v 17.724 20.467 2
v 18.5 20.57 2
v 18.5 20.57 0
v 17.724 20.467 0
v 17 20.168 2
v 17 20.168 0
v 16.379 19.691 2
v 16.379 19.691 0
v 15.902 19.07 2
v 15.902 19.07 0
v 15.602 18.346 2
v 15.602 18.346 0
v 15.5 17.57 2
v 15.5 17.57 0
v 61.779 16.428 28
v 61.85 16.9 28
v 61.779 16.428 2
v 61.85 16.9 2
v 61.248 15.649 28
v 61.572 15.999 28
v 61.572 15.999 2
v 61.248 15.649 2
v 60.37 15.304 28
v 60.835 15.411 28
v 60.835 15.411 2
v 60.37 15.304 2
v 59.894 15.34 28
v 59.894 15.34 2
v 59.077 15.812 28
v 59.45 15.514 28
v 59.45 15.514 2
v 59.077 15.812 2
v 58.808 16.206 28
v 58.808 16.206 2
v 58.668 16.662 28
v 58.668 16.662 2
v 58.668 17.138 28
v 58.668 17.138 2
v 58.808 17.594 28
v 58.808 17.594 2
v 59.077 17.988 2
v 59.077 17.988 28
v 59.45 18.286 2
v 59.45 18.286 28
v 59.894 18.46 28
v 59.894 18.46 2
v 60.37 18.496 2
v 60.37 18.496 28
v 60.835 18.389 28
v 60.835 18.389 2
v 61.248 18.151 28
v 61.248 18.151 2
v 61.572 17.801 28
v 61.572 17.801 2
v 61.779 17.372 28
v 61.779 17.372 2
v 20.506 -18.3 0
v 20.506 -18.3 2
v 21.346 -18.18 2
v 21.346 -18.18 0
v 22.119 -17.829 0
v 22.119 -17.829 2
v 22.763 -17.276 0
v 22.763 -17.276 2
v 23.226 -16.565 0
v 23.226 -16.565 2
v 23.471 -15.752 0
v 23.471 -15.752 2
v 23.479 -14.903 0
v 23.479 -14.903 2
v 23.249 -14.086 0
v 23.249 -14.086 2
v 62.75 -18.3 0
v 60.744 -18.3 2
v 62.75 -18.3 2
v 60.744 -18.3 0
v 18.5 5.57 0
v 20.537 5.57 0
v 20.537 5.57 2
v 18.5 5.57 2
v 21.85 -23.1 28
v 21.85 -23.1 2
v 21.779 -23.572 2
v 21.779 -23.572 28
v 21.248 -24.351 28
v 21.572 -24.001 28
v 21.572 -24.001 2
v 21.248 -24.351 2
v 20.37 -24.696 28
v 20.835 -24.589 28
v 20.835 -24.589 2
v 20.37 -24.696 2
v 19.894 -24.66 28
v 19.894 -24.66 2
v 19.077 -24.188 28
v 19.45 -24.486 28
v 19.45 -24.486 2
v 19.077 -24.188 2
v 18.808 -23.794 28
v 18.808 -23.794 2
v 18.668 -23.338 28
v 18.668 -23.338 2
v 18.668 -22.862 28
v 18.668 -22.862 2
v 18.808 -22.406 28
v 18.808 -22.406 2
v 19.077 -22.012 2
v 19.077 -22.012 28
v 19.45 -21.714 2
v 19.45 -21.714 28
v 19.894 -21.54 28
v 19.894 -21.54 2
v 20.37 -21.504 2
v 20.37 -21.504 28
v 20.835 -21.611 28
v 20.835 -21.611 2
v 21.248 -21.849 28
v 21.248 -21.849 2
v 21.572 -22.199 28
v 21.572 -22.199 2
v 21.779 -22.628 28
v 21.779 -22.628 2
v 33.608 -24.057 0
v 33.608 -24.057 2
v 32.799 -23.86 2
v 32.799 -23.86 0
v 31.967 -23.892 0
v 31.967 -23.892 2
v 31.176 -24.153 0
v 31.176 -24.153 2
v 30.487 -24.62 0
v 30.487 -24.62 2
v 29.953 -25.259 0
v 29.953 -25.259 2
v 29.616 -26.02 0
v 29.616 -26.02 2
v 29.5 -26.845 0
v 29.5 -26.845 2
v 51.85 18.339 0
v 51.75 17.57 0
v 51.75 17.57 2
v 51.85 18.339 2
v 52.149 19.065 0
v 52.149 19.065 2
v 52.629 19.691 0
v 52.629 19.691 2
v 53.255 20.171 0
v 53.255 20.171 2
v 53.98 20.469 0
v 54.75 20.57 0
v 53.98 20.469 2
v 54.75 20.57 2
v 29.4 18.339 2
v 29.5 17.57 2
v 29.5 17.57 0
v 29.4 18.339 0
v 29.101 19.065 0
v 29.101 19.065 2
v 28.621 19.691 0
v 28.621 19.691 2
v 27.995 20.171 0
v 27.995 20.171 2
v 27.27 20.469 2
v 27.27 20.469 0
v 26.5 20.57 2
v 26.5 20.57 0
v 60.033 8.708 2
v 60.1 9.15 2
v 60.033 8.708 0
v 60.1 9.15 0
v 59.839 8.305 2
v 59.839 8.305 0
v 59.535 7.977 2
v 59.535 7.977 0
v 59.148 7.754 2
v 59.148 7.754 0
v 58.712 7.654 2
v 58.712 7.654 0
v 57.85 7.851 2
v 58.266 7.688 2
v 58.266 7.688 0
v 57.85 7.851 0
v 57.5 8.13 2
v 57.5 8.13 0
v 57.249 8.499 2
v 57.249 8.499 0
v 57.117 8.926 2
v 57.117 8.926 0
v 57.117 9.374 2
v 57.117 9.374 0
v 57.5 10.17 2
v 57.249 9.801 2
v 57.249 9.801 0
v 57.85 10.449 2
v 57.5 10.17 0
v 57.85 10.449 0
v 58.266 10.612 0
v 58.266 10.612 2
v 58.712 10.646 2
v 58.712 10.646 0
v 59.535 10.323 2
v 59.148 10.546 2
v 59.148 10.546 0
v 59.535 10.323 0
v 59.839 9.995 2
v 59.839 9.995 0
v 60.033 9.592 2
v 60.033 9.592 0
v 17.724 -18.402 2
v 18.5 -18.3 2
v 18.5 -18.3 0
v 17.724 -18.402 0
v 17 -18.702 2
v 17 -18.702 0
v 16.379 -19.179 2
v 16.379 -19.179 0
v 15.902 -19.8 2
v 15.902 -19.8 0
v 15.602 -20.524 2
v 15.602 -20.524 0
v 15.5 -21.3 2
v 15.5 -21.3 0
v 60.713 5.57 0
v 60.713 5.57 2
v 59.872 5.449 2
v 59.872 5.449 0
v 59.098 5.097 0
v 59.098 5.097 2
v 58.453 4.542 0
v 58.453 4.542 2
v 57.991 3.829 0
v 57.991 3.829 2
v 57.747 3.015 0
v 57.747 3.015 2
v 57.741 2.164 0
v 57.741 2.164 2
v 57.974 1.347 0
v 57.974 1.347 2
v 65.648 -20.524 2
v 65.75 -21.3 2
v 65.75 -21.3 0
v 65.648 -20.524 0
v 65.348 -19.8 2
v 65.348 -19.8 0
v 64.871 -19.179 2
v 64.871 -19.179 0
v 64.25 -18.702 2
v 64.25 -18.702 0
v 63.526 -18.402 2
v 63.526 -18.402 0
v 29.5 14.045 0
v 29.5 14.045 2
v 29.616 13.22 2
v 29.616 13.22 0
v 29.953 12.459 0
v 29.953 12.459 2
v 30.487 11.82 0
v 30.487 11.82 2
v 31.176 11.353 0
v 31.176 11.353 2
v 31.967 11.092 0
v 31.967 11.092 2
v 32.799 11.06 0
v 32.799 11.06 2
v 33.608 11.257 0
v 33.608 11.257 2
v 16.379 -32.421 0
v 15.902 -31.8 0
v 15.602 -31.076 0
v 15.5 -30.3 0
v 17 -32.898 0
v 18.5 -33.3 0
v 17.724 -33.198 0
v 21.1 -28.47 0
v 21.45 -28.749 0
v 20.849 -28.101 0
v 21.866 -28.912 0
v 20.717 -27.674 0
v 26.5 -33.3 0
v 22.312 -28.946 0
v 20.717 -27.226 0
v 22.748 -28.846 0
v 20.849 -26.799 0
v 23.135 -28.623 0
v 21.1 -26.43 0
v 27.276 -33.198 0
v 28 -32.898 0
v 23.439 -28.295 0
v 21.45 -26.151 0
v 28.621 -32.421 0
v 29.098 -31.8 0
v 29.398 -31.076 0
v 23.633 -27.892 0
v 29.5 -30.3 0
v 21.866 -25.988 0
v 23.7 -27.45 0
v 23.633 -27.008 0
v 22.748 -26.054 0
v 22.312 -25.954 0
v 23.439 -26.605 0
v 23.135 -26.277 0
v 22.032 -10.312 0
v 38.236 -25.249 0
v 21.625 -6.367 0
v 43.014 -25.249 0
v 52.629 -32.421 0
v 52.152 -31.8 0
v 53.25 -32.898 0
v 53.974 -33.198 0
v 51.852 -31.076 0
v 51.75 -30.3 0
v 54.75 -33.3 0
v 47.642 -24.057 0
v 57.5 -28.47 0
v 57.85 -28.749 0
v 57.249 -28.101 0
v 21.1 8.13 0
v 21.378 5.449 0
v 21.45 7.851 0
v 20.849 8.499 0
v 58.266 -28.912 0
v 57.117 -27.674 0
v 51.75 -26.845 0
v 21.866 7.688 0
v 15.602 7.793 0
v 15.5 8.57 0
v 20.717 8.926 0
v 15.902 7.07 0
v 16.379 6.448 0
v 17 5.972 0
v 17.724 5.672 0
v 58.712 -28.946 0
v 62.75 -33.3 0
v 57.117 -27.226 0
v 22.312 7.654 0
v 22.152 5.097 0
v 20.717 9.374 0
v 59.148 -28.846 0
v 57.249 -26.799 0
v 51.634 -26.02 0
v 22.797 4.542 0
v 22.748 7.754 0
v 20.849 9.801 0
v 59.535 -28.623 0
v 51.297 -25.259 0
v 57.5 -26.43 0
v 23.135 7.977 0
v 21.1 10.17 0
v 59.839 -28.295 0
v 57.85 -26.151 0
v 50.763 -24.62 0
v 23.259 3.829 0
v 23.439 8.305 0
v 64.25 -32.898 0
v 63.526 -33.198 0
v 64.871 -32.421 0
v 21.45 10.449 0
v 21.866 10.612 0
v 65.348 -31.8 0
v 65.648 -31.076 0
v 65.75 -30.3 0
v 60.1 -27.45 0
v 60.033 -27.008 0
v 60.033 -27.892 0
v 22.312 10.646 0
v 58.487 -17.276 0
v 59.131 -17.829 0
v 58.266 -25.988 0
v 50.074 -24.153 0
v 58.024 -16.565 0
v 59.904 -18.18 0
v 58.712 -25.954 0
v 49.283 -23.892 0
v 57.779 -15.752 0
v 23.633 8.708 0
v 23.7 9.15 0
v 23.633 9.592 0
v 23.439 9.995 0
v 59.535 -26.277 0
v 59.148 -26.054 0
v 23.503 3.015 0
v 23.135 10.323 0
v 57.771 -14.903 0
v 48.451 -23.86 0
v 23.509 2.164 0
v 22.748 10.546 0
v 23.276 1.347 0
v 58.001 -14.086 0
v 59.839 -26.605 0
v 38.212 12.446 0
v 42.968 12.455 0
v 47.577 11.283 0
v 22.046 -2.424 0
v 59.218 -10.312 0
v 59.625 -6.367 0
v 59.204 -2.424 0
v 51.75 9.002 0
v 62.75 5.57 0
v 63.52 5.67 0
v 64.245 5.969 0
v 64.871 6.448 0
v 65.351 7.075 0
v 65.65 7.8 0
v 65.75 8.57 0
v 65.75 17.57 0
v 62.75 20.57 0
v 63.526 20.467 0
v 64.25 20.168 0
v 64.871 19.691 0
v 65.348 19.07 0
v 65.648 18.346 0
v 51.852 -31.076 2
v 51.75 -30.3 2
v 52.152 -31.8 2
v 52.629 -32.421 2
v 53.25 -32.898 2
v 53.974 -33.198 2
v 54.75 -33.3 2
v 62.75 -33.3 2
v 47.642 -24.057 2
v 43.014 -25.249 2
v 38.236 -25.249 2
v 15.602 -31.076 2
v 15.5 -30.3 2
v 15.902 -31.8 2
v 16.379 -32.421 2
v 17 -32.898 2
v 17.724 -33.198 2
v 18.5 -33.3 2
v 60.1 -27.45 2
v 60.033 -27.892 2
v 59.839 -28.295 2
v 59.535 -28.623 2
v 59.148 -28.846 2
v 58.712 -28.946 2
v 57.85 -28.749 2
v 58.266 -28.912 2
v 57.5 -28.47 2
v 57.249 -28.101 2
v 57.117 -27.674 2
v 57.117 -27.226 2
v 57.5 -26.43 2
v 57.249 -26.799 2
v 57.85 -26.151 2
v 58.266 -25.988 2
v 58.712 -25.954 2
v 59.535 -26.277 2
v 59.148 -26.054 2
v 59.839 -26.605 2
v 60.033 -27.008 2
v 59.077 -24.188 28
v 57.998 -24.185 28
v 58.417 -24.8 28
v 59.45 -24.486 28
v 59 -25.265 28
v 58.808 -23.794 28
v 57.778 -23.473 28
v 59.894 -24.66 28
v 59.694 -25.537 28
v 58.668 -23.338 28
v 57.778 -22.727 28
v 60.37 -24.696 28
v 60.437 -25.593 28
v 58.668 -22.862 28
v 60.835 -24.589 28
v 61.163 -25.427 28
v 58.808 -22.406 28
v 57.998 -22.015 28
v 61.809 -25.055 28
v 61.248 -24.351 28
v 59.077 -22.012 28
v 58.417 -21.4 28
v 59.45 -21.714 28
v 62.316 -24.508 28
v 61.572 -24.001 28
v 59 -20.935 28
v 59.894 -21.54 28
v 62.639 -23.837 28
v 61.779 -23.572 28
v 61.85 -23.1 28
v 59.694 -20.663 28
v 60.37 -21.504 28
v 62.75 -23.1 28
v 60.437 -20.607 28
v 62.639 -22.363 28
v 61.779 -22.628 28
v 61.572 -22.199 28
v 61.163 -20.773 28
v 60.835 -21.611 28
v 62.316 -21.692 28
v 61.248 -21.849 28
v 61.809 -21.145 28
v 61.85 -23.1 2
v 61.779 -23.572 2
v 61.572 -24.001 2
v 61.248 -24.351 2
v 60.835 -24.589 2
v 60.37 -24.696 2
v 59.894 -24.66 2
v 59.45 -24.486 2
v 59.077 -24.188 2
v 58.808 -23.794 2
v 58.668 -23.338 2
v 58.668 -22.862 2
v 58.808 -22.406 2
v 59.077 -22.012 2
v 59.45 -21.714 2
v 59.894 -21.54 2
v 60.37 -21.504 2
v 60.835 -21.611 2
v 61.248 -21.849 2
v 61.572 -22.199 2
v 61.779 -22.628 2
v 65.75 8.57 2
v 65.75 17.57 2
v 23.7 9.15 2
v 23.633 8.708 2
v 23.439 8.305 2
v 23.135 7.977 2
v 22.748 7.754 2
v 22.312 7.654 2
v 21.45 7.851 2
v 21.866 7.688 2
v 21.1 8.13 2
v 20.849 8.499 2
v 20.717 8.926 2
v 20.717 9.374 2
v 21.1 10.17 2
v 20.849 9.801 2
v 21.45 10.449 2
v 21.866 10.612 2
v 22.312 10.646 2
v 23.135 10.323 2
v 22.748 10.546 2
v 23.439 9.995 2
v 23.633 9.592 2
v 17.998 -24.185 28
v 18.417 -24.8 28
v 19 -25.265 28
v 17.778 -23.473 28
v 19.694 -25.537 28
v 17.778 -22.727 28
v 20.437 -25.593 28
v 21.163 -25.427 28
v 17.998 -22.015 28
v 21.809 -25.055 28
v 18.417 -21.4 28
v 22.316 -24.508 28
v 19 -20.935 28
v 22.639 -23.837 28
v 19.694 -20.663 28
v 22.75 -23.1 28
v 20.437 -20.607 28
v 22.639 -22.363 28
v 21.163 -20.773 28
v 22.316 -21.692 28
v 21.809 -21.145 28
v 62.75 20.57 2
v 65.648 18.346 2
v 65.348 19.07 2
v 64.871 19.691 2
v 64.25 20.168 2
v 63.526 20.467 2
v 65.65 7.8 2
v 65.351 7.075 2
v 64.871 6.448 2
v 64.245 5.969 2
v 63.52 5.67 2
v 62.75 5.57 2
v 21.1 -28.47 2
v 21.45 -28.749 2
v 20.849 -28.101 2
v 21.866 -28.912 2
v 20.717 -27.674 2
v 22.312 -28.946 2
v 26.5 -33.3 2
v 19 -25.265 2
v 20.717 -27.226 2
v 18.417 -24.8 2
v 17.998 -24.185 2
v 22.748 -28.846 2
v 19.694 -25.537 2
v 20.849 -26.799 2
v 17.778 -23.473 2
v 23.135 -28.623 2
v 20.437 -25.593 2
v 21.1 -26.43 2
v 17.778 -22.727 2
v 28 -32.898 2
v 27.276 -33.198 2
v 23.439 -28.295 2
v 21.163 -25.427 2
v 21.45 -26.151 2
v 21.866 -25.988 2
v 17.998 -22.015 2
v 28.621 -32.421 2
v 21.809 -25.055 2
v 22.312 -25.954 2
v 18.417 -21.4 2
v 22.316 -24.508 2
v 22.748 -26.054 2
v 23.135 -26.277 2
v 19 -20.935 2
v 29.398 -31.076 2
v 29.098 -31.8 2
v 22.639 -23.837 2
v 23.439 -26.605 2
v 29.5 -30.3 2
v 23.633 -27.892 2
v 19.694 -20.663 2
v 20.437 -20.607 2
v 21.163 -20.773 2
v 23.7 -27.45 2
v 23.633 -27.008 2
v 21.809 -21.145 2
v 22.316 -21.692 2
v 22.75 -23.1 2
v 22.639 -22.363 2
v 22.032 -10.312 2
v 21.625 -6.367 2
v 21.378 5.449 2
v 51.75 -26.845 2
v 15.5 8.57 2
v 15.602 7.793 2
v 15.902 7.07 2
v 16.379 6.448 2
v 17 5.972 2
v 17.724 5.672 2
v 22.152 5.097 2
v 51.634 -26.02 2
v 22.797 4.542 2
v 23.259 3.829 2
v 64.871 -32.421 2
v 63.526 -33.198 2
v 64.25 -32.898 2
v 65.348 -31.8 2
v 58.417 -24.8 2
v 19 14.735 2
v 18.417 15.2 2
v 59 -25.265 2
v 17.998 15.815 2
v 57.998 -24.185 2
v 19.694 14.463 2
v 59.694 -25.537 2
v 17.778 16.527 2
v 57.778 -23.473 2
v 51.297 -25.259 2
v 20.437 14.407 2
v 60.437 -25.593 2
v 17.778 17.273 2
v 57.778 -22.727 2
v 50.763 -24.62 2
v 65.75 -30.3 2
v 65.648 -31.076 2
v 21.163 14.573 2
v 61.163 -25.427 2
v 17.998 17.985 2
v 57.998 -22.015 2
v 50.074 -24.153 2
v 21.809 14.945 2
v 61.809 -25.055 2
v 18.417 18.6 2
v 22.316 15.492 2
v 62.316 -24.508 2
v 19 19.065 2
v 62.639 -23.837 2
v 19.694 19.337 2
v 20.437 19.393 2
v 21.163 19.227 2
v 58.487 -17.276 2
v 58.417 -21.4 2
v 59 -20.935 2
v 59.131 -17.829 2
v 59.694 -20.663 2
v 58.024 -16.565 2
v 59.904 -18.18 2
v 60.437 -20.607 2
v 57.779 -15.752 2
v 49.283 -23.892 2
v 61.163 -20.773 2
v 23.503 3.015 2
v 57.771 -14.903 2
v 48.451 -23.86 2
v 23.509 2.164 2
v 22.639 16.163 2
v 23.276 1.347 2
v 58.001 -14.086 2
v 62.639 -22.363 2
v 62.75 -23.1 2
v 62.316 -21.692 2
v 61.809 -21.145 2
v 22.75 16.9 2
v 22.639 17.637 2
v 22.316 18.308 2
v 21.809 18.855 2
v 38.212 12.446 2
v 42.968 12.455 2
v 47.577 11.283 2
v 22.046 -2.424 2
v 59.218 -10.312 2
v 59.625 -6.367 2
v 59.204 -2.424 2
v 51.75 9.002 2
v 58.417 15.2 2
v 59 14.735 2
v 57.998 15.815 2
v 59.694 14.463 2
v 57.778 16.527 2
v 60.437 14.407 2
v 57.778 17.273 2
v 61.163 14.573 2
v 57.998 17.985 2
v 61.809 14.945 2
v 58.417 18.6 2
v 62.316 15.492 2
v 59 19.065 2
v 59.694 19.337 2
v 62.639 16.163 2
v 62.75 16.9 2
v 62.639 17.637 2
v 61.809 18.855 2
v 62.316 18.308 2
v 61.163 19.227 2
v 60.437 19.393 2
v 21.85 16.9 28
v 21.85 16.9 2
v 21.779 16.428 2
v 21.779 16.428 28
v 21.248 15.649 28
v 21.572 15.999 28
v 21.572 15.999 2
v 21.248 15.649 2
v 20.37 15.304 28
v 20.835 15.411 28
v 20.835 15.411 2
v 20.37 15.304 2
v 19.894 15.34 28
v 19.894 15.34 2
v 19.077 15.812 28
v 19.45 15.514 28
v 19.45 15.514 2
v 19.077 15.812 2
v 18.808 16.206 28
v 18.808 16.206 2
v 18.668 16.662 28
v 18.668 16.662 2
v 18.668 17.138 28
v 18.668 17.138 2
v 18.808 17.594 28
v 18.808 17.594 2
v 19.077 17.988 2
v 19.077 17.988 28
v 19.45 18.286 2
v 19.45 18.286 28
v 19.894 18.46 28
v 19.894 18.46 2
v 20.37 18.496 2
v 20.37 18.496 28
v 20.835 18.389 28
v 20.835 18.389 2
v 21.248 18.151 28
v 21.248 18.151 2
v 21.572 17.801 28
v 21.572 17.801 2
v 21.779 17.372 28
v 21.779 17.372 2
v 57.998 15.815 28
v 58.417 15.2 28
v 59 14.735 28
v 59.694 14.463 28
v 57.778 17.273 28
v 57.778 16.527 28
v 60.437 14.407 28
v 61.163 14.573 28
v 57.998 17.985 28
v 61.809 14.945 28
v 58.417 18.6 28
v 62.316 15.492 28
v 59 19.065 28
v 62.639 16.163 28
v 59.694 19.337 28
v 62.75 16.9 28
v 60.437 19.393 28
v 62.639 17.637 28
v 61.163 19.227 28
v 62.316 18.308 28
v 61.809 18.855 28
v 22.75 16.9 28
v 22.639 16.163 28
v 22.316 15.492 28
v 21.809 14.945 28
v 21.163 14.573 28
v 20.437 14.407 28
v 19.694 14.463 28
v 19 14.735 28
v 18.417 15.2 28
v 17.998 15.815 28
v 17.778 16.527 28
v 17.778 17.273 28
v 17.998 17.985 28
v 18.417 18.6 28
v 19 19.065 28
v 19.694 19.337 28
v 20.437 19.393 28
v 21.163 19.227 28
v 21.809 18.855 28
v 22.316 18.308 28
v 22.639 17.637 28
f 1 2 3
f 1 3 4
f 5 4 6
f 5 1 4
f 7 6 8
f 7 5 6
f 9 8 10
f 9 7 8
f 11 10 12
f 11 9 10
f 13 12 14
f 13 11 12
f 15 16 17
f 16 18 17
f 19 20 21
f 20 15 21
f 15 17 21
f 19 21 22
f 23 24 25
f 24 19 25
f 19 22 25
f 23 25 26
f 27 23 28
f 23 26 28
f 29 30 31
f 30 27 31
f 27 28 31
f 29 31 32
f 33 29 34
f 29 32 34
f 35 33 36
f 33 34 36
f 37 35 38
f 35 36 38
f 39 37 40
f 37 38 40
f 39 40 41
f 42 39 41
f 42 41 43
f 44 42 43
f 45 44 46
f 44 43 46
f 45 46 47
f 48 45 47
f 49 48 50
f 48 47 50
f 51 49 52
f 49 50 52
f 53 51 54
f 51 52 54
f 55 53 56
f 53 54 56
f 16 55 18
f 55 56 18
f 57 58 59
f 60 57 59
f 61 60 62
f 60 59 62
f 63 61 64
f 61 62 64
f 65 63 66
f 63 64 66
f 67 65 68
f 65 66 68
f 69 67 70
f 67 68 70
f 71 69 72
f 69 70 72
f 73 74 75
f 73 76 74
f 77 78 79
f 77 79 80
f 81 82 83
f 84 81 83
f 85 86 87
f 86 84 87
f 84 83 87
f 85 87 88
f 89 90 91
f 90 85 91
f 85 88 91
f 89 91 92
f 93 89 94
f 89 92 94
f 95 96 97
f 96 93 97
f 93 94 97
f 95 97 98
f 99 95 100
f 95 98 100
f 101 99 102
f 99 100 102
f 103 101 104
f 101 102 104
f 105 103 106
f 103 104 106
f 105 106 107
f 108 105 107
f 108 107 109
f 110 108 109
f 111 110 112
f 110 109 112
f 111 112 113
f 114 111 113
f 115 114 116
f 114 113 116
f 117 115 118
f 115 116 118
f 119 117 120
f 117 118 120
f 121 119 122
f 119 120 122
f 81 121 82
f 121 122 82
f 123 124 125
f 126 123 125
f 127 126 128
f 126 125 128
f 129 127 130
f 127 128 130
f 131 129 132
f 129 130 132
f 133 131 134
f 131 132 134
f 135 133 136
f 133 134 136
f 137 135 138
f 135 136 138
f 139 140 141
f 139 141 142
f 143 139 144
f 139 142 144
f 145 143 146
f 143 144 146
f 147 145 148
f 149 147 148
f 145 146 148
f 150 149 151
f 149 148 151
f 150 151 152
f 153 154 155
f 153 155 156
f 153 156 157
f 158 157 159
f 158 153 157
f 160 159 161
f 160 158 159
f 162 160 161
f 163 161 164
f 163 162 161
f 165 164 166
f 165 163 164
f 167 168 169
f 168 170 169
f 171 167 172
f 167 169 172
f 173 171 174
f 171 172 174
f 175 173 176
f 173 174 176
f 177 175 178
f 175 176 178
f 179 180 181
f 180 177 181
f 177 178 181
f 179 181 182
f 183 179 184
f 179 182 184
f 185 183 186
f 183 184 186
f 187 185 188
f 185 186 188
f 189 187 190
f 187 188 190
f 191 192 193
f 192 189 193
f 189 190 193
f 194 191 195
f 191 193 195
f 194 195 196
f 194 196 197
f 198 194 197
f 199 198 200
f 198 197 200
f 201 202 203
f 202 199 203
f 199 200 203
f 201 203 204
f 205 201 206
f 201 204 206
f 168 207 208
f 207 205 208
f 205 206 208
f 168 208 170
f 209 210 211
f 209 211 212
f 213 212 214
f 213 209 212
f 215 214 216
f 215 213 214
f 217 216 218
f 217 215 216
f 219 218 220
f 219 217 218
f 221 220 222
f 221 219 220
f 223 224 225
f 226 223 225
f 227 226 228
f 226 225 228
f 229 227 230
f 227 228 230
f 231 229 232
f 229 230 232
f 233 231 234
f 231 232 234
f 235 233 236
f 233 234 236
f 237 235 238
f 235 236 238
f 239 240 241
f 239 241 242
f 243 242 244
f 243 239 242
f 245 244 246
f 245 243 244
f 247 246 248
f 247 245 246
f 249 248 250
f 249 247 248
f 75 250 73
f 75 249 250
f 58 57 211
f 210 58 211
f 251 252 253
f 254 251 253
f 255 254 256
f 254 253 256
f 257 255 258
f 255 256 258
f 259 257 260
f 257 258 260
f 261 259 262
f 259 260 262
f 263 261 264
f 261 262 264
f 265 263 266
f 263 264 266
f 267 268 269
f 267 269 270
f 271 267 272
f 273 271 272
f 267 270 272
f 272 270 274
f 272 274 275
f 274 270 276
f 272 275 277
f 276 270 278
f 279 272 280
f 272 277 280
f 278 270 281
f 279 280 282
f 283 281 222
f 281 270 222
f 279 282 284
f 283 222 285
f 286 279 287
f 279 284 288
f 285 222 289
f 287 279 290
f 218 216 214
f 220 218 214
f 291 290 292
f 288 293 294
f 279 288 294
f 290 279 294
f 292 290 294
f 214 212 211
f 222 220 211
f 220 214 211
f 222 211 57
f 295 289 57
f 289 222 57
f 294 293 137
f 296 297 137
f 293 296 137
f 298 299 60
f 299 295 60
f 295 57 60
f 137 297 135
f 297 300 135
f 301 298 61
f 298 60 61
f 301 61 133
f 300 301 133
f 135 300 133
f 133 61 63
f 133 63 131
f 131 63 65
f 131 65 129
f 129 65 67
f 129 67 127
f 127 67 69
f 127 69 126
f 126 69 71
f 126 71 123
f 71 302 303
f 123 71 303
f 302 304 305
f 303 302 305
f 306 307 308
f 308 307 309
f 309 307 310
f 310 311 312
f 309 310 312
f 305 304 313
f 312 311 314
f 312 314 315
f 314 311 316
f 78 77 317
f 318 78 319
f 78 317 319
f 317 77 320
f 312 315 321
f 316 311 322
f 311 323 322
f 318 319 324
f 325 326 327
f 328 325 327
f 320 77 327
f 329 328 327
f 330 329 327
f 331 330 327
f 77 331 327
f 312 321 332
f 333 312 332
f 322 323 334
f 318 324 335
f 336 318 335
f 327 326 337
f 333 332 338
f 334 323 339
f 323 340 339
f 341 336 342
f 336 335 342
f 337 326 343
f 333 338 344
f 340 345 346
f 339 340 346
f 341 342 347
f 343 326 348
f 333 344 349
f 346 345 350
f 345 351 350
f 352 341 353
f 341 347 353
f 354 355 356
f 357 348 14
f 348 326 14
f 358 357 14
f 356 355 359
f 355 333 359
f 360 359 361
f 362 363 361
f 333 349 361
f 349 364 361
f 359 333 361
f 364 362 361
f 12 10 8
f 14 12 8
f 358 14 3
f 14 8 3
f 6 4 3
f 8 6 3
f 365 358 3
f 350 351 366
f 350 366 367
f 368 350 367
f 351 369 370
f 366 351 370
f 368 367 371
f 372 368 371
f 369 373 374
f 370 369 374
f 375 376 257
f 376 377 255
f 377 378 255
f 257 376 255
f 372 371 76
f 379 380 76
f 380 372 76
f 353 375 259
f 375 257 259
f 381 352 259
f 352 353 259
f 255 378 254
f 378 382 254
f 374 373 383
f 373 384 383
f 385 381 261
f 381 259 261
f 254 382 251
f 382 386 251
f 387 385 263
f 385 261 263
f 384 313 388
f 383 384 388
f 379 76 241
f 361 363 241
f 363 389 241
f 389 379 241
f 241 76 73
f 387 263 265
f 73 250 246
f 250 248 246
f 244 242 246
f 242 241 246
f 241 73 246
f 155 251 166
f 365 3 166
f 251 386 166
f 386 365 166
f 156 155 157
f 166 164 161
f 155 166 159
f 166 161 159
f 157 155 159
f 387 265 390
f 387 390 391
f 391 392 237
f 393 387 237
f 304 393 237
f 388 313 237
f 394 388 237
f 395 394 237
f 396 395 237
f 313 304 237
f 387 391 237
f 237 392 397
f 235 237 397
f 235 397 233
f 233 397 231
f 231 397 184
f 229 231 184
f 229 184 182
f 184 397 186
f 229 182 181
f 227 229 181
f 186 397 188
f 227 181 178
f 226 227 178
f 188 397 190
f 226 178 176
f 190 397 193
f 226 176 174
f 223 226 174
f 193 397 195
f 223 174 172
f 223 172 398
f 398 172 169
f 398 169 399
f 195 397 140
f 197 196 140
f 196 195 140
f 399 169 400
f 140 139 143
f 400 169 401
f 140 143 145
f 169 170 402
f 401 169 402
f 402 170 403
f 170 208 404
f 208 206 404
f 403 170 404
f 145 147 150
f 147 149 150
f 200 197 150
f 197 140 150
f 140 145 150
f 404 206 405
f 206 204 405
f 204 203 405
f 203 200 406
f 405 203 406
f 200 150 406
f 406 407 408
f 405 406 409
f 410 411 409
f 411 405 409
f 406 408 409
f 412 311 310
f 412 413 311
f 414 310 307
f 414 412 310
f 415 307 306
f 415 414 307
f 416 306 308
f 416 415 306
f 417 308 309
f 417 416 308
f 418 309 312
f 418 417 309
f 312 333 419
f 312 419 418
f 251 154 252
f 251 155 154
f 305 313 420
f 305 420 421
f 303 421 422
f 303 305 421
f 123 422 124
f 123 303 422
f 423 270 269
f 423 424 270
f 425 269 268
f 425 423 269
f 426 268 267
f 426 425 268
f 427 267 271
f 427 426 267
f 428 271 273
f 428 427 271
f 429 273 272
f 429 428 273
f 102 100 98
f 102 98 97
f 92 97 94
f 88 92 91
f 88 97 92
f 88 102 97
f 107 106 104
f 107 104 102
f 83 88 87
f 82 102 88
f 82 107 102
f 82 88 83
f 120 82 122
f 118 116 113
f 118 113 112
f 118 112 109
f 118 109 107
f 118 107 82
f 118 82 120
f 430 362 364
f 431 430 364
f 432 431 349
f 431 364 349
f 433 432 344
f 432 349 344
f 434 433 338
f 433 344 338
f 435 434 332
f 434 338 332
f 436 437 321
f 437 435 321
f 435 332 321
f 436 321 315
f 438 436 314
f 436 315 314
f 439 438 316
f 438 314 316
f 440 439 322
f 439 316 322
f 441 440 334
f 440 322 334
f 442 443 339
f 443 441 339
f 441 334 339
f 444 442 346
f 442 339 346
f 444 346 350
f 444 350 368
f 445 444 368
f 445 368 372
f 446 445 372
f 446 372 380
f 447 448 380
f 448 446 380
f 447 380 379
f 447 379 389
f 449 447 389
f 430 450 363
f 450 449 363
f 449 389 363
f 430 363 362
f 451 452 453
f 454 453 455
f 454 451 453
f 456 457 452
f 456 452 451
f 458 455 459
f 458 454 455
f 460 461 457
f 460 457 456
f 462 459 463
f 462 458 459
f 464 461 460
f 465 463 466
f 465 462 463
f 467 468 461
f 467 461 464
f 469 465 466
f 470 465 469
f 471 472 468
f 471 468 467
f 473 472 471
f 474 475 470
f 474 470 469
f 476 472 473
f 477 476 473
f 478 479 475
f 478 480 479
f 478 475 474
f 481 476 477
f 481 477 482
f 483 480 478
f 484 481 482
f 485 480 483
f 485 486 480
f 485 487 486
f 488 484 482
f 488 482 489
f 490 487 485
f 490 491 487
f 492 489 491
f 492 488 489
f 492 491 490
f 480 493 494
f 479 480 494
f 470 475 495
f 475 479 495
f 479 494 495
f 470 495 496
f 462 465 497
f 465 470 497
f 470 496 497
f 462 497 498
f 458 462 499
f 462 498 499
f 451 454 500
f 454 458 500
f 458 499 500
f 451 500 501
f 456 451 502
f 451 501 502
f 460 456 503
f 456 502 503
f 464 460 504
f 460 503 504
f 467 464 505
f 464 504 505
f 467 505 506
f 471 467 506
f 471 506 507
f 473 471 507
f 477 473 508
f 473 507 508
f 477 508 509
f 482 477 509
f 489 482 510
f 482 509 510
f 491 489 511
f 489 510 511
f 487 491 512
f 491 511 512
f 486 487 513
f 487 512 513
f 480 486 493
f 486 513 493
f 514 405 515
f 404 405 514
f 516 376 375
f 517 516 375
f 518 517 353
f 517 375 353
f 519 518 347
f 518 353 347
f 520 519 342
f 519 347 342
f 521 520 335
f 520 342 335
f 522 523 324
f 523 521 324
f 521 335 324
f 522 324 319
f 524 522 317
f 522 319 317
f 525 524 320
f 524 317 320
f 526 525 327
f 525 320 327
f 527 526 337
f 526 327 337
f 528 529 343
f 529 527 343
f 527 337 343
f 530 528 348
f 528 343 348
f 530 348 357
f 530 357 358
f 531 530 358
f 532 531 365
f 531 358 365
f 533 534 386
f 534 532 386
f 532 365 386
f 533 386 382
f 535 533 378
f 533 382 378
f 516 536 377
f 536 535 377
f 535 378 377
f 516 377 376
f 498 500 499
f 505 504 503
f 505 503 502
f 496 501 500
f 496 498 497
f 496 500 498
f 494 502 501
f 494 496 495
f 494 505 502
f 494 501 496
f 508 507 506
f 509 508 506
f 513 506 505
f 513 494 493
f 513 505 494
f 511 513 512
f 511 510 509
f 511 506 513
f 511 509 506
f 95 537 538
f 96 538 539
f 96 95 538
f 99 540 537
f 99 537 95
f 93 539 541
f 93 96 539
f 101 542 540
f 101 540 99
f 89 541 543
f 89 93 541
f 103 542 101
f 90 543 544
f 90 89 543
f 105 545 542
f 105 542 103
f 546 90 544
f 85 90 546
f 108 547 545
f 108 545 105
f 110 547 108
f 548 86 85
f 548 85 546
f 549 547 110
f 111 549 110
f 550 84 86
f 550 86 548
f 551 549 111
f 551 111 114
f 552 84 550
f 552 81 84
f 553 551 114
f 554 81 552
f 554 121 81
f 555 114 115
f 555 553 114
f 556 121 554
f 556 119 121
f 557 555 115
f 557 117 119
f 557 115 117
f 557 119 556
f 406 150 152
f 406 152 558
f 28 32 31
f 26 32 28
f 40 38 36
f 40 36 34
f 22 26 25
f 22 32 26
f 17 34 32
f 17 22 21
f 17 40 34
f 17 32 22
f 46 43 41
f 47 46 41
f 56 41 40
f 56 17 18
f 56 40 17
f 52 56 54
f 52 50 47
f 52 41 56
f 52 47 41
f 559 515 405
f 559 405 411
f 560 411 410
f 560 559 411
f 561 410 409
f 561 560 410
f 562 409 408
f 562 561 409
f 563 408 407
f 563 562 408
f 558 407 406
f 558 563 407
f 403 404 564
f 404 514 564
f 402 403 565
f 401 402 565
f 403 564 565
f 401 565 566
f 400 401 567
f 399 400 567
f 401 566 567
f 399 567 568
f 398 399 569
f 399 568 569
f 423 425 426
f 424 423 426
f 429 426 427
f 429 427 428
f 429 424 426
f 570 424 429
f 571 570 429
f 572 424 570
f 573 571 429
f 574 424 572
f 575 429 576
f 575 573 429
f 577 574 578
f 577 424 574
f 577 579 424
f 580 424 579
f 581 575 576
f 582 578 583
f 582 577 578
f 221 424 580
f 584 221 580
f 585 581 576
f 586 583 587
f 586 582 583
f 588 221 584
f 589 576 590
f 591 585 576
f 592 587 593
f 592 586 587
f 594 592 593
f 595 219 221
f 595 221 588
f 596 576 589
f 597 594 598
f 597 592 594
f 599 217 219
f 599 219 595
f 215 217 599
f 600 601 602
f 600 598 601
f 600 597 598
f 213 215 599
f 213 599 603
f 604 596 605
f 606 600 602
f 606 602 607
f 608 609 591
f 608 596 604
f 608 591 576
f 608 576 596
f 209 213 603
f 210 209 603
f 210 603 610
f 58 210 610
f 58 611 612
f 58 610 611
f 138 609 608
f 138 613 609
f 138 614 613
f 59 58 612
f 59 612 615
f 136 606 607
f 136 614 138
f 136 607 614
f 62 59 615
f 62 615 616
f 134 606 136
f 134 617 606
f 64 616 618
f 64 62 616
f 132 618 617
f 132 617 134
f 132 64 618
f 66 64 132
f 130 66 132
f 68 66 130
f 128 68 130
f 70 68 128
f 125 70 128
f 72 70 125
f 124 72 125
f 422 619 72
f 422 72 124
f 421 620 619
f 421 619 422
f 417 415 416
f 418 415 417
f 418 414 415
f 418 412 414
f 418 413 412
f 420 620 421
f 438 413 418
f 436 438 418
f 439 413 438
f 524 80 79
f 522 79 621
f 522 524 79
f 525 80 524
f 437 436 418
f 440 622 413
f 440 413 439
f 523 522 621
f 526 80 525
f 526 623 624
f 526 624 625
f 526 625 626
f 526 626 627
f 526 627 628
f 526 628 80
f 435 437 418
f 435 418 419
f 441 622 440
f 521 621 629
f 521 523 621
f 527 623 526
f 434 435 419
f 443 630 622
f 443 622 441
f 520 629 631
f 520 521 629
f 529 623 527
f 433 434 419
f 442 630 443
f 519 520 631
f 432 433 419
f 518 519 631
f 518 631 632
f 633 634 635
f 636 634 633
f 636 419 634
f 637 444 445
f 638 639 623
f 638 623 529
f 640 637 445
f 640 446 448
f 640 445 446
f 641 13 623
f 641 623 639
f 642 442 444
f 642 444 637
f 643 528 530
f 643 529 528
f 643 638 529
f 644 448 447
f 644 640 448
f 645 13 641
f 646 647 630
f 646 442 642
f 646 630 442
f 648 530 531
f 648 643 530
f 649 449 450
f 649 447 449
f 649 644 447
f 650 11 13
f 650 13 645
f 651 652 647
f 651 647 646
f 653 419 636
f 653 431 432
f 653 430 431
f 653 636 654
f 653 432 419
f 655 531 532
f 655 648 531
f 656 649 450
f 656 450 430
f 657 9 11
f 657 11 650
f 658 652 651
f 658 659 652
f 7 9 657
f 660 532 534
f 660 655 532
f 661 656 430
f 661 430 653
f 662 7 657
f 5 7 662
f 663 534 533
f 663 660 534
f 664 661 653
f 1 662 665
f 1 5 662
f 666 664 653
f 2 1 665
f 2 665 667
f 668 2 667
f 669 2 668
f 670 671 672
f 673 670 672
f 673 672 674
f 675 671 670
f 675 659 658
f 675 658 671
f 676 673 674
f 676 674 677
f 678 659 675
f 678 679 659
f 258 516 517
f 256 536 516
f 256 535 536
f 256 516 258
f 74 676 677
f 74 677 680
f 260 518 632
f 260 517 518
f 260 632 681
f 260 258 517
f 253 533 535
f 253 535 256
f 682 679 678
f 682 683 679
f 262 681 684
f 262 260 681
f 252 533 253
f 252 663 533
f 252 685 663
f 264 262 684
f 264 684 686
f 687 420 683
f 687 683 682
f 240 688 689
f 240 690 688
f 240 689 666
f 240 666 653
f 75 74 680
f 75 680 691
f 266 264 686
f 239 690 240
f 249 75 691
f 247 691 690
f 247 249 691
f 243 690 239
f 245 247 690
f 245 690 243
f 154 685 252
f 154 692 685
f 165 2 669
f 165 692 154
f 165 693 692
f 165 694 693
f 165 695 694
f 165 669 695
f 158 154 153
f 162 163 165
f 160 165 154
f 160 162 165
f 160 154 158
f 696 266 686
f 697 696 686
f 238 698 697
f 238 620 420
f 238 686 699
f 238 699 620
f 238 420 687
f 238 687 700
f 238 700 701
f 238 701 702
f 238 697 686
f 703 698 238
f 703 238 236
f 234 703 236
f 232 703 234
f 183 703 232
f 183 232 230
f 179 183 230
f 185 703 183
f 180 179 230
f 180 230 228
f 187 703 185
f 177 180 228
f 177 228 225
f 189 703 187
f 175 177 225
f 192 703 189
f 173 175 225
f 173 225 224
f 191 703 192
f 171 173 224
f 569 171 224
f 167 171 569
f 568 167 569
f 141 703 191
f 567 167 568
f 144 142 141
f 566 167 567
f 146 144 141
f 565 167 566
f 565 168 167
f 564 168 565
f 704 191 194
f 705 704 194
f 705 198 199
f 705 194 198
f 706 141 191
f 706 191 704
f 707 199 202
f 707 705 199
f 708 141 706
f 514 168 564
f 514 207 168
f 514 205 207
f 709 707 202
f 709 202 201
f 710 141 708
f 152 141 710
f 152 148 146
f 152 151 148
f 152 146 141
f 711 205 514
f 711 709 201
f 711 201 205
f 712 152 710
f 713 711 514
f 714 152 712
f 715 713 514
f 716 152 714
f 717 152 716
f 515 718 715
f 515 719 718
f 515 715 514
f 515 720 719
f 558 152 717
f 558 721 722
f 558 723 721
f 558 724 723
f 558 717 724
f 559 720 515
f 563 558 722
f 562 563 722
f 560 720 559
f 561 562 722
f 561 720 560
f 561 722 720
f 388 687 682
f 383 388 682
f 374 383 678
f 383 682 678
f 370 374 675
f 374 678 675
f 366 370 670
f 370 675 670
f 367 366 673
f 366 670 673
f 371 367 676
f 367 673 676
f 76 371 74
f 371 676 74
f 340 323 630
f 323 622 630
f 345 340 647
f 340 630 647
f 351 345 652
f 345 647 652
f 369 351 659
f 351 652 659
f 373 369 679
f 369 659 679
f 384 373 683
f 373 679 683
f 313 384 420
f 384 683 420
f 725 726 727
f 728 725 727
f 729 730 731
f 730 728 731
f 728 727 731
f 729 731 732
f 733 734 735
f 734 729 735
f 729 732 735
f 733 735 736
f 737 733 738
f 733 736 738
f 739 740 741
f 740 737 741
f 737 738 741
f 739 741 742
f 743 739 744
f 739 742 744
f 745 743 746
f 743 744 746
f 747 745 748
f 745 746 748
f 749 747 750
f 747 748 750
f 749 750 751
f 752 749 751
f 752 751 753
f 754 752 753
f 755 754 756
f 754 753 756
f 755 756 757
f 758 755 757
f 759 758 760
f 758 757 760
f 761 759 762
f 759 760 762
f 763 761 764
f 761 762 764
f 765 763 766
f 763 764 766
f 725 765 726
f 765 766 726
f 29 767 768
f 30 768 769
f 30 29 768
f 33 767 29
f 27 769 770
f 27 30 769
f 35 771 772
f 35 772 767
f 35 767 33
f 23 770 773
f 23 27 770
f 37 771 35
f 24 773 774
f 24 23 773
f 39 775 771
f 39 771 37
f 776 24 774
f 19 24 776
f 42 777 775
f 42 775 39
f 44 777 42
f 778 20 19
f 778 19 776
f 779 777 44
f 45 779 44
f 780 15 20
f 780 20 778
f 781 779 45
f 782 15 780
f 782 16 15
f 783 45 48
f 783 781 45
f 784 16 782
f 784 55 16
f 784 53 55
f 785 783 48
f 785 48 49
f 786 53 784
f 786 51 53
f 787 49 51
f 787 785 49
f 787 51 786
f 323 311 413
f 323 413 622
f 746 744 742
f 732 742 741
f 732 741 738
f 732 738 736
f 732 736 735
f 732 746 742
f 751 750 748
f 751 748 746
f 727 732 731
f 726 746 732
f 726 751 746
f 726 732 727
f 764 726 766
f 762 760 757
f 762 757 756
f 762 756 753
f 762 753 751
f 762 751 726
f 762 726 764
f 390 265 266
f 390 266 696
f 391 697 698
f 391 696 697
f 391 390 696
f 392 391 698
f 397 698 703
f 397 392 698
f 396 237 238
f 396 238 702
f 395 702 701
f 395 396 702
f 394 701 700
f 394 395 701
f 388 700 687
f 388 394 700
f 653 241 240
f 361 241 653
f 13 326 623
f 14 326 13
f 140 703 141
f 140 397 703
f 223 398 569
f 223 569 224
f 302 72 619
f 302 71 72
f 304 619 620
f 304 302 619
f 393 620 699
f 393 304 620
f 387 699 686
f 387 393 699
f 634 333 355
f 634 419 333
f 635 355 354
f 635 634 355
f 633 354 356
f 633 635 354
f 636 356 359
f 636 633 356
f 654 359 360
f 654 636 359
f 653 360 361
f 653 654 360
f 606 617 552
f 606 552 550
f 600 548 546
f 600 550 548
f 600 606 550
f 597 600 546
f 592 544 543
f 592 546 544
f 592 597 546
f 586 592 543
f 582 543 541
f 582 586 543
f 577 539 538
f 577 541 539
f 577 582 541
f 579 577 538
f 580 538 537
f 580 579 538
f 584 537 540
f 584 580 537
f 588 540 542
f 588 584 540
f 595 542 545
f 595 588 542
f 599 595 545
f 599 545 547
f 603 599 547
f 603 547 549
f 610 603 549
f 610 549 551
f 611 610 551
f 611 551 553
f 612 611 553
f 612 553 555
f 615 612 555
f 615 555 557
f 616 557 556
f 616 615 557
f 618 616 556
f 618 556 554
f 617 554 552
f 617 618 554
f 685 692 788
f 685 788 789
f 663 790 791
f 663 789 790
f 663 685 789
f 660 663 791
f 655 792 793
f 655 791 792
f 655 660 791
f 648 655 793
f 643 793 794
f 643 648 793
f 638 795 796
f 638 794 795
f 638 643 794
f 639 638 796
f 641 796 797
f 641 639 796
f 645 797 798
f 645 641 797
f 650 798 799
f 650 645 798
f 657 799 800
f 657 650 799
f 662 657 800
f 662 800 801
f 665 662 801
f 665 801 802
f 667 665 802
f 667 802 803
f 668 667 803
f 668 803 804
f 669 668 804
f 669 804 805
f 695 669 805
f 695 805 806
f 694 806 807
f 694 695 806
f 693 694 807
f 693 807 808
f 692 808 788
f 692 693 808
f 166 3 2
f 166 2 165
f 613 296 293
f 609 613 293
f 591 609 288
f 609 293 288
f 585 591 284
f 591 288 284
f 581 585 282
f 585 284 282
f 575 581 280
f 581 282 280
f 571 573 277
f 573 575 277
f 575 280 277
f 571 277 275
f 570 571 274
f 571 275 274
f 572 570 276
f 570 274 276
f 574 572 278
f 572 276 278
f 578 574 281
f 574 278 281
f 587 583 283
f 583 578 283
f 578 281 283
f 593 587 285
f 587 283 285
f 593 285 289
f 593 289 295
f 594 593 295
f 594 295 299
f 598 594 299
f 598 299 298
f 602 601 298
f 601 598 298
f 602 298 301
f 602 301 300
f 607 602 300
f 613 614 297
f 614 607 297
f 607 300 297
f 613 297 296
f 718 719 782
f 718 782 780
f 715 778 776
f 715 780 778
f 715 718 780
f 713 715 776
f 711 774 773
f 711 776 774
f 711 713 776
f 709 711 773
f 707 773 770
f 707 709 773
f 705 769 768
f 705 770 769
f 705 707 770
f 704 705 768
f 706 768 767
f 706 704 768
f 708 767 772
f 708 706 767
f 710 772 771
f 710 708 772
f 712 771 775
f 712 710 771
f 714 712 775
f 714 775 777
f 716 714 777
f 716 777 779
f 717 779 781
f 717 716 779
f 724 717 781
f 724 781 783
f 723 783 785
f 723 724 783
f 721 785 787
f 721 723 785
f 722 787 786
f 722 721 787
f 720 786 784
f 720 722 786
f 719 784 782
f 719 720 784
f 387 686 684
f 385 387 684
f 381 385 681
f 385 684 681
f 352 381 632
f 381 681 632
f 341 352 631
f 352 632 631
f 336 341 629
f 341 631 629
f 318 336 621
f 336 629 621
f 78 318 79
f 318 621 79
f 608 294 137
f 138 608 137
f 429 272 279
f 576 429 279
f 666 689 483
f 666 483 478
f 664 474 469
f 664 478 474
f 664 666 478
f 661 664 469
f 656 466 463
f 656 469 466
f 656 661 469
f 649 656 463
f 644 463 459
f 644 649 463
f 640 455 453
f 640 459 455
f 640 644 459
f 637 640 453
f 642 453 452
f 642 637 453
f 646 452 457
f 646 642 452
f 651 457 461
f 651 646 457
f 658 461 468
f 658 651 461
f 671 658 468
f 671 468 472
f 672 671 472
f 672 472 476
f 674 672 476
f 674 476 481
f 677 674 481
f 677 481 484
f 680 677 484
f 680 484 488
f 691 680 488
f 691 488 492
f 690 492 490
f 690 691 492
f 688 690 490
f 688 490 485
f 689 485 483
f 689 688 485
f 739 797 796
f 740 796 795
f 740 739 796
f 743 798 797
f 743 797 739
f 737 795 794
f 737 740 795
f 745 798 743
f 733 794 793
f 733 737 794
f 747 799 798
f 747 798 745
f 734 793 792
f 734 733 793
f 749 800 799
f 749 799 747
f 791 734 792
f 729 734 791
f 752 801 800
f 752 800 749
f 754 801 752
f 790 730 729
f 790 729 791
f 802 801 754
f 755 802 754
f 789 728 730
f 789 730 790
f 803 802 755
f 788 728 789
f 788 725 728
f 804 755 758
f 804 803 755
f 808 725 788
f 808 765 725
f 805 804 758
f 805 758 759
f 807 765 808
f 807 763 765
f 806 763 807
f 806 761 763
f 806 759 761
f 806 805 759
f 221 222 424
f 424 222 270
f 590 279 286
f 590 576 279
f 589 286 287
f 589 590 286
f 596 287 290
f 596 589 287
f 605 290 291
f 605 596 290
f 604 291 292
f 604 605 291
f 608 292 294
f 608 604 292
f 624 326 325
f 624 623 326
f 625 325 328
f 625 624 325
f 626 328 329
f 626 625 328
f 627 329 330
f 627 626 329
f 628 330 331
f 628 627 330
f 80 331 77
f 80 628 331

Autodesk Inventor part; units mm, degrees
ref_plane "YZ Plane" through (0, 0, 0) normal (1, 0, 0) x (0, 1, 0)
ref_plane "XZ Plane" through (0, 0, 0) normal (0, 1, 0) x (-1, 0, 0)
ref_plane "Work Plane1" through (0, 0, 0) normal (0, 0, 1) x (1, 0, 0)
sketch "Sketch1" plane through (0, 0, 0) normal (0, 0, 1) x (1, 0, 0)
  circle A0 centre (22.2, -27.45) radius 1.5 projected
  circle A1 centre (58.6, -27.45) radius 1.5 projected
  circle A2 centre (22.2, 9.15) radius 1.5 projected
  circle A3 centre (58.6, 9.15) radius 1.5 projected
  line L0 (15.5, 16.5) -> (15.5, -25.3) projected
  line L1 (19.5, -29.3) -> (61, -29.3) projected
  line L2 (61, 20.5) -> (19.5, 20.5) projected
  line L3 (64.8607, 14) -> (64.8607, -18) projected
  line L4 (65.75, -18) -> (65.75, 14) projected
  line L5 (65.75, -33.3) -> (51.75, -33.3)
  line L6 (51.75, -33.3) -> (51.75, -21.8024)
  line L7 (55.4368, -18.3) -> (65.75, -18.3)
  line L8 (65.75, -18.3) -> (65.75, -33.3)
  line L9 (15.5, -33.3) -> (29.5, -33.3)
  line L10 (29.5, -33.3) -> (29.5, -21.8024)
  line L11 (25.8132, -18.3) -> (15.5, -18.3)
  line L12 (15.5, -18.3) -> (15.5, -33.3)
  line L13 (15.5, 20.5697) -> (29.5, 20.5697)
  line L14 (29.5, 20.5697) -> (29.5, 9.0024)
  line L15 (25.8695, 5.5697) -> (15.5, 5.5697)
  line L16 (15.5, 5.5697) -> (15.5, 20.5697)
  line L17 (51.75, 20.5697) -> (65.75, 20.5697)
  line L18 (65.75, 20.5697) -> (65.75, 5.5697)
  line L19 (65.75, 5.5697) -> (55.3805, 5.5697)
  line L20 (51.75, 9.0024) -> (51.75, 20.5697)
  arc A4 (51.75, 9.0024) -> (29.5, 9.0024) centre (40.625, -6.4) ccw
  arc A5 (25.8695, 5.5697) -> (25.8132, -18.3) centre (40.625, -6.4) ccw
  arc A6 (29.5, -21.8024) -> (51.75, -21.8024) centre (40.625, -6.4) ccw
  arc A7 (55.4368, -18.3) -> (55.3805, 5.5697) centre (40.625, -6.4) ccw
  line L21 (65.75, 20.5697) -> (65.75, 5.5697)
  line L22 (65.75, -18.3) -> (65.75, -33.3)
  line L23 (15.5, 20.5697) -> (29.5, 20.5697)
  line L24 (51.75, 20.5697) -> (65.75, 20.5697)
  line L25 (15.5, -33.3) -> (15.5, -18.3)
  line L26 (15.5, 5.5697) -> (15.5, 20.5697)
  point P0 (0, 0)
  point P1 (40.25, 20.5)
  dimension "d10" = 50.25
  dimension "d13" = 26.9
extrude "Extrusion1" add sketch "Sketch1" along normal blind 2 contours L16 L13 L14 A4 L20 L17 L18 L4 L19 A7 L7 L8 L5 L6 A6 L10 L9 L12 L0 L11 A5 L15
fillet "Fillet1" radius 3 7 edges at (55.3805, 5.5697, 1) (29.5, -21.8024, 1) (25.8132, -18.3, 1) (29.5, 9.0024, 1) (55.4368, -18.3, 1) (25.8695, 5.5697, 1) (51.75, -21.8024, 1)
fillet "Fillet2" radius 3 12 edges at (15.5, 20.5697, 1) (15.5, 5.5697, 1) (29.5, 20.5697, 1) (51.75, 20.5697, 1) (65.75, 20.5697, 1) (65.75, -18.3, 1) (51.75, -33.3, 1) (15.5, -18.3, 1) (15.5, -33.3, 1) (29.5, -33.3, 1) (65.75, -33.3, 1) (65.75, 5.5697, 1)
sketch "Sketch2" plane through (0, 0, 2) normal (0, 0, 1) x (1, 0, 0)
  circle A0 centre (60.25, -23.1) radius 1.6 projected
  circle A1 centre (20.25, -23.1) radius 1.6 projected
  circle A2 centre (20.25, 16.9) radius 1.6 projected
  circle A3 centre (60.25, 16.9) radius 1.6 projected
  circle A4 centre (20.25, -23.1) radius 2.5
  circle A5 centre (60.25, 16.9) radius 2.5
  circle A6 centre (20.25, 16.9) radius 2.5
  circle A7 centre (60.25, -23.1) radius 2.5
  point P0 (0, 0)
  dimension "d17" = 5
  dimension "d18" = 5
  dimension "d19" = 5
  dimension "d20" = 5
extrude "Extrusion2" add sketch "Sketch2" along normal blind 26
equation "\"d13\" = 0.5 * d11"
equation "\"d11\" = 53.8"
properties part number "soporteHBridge"
